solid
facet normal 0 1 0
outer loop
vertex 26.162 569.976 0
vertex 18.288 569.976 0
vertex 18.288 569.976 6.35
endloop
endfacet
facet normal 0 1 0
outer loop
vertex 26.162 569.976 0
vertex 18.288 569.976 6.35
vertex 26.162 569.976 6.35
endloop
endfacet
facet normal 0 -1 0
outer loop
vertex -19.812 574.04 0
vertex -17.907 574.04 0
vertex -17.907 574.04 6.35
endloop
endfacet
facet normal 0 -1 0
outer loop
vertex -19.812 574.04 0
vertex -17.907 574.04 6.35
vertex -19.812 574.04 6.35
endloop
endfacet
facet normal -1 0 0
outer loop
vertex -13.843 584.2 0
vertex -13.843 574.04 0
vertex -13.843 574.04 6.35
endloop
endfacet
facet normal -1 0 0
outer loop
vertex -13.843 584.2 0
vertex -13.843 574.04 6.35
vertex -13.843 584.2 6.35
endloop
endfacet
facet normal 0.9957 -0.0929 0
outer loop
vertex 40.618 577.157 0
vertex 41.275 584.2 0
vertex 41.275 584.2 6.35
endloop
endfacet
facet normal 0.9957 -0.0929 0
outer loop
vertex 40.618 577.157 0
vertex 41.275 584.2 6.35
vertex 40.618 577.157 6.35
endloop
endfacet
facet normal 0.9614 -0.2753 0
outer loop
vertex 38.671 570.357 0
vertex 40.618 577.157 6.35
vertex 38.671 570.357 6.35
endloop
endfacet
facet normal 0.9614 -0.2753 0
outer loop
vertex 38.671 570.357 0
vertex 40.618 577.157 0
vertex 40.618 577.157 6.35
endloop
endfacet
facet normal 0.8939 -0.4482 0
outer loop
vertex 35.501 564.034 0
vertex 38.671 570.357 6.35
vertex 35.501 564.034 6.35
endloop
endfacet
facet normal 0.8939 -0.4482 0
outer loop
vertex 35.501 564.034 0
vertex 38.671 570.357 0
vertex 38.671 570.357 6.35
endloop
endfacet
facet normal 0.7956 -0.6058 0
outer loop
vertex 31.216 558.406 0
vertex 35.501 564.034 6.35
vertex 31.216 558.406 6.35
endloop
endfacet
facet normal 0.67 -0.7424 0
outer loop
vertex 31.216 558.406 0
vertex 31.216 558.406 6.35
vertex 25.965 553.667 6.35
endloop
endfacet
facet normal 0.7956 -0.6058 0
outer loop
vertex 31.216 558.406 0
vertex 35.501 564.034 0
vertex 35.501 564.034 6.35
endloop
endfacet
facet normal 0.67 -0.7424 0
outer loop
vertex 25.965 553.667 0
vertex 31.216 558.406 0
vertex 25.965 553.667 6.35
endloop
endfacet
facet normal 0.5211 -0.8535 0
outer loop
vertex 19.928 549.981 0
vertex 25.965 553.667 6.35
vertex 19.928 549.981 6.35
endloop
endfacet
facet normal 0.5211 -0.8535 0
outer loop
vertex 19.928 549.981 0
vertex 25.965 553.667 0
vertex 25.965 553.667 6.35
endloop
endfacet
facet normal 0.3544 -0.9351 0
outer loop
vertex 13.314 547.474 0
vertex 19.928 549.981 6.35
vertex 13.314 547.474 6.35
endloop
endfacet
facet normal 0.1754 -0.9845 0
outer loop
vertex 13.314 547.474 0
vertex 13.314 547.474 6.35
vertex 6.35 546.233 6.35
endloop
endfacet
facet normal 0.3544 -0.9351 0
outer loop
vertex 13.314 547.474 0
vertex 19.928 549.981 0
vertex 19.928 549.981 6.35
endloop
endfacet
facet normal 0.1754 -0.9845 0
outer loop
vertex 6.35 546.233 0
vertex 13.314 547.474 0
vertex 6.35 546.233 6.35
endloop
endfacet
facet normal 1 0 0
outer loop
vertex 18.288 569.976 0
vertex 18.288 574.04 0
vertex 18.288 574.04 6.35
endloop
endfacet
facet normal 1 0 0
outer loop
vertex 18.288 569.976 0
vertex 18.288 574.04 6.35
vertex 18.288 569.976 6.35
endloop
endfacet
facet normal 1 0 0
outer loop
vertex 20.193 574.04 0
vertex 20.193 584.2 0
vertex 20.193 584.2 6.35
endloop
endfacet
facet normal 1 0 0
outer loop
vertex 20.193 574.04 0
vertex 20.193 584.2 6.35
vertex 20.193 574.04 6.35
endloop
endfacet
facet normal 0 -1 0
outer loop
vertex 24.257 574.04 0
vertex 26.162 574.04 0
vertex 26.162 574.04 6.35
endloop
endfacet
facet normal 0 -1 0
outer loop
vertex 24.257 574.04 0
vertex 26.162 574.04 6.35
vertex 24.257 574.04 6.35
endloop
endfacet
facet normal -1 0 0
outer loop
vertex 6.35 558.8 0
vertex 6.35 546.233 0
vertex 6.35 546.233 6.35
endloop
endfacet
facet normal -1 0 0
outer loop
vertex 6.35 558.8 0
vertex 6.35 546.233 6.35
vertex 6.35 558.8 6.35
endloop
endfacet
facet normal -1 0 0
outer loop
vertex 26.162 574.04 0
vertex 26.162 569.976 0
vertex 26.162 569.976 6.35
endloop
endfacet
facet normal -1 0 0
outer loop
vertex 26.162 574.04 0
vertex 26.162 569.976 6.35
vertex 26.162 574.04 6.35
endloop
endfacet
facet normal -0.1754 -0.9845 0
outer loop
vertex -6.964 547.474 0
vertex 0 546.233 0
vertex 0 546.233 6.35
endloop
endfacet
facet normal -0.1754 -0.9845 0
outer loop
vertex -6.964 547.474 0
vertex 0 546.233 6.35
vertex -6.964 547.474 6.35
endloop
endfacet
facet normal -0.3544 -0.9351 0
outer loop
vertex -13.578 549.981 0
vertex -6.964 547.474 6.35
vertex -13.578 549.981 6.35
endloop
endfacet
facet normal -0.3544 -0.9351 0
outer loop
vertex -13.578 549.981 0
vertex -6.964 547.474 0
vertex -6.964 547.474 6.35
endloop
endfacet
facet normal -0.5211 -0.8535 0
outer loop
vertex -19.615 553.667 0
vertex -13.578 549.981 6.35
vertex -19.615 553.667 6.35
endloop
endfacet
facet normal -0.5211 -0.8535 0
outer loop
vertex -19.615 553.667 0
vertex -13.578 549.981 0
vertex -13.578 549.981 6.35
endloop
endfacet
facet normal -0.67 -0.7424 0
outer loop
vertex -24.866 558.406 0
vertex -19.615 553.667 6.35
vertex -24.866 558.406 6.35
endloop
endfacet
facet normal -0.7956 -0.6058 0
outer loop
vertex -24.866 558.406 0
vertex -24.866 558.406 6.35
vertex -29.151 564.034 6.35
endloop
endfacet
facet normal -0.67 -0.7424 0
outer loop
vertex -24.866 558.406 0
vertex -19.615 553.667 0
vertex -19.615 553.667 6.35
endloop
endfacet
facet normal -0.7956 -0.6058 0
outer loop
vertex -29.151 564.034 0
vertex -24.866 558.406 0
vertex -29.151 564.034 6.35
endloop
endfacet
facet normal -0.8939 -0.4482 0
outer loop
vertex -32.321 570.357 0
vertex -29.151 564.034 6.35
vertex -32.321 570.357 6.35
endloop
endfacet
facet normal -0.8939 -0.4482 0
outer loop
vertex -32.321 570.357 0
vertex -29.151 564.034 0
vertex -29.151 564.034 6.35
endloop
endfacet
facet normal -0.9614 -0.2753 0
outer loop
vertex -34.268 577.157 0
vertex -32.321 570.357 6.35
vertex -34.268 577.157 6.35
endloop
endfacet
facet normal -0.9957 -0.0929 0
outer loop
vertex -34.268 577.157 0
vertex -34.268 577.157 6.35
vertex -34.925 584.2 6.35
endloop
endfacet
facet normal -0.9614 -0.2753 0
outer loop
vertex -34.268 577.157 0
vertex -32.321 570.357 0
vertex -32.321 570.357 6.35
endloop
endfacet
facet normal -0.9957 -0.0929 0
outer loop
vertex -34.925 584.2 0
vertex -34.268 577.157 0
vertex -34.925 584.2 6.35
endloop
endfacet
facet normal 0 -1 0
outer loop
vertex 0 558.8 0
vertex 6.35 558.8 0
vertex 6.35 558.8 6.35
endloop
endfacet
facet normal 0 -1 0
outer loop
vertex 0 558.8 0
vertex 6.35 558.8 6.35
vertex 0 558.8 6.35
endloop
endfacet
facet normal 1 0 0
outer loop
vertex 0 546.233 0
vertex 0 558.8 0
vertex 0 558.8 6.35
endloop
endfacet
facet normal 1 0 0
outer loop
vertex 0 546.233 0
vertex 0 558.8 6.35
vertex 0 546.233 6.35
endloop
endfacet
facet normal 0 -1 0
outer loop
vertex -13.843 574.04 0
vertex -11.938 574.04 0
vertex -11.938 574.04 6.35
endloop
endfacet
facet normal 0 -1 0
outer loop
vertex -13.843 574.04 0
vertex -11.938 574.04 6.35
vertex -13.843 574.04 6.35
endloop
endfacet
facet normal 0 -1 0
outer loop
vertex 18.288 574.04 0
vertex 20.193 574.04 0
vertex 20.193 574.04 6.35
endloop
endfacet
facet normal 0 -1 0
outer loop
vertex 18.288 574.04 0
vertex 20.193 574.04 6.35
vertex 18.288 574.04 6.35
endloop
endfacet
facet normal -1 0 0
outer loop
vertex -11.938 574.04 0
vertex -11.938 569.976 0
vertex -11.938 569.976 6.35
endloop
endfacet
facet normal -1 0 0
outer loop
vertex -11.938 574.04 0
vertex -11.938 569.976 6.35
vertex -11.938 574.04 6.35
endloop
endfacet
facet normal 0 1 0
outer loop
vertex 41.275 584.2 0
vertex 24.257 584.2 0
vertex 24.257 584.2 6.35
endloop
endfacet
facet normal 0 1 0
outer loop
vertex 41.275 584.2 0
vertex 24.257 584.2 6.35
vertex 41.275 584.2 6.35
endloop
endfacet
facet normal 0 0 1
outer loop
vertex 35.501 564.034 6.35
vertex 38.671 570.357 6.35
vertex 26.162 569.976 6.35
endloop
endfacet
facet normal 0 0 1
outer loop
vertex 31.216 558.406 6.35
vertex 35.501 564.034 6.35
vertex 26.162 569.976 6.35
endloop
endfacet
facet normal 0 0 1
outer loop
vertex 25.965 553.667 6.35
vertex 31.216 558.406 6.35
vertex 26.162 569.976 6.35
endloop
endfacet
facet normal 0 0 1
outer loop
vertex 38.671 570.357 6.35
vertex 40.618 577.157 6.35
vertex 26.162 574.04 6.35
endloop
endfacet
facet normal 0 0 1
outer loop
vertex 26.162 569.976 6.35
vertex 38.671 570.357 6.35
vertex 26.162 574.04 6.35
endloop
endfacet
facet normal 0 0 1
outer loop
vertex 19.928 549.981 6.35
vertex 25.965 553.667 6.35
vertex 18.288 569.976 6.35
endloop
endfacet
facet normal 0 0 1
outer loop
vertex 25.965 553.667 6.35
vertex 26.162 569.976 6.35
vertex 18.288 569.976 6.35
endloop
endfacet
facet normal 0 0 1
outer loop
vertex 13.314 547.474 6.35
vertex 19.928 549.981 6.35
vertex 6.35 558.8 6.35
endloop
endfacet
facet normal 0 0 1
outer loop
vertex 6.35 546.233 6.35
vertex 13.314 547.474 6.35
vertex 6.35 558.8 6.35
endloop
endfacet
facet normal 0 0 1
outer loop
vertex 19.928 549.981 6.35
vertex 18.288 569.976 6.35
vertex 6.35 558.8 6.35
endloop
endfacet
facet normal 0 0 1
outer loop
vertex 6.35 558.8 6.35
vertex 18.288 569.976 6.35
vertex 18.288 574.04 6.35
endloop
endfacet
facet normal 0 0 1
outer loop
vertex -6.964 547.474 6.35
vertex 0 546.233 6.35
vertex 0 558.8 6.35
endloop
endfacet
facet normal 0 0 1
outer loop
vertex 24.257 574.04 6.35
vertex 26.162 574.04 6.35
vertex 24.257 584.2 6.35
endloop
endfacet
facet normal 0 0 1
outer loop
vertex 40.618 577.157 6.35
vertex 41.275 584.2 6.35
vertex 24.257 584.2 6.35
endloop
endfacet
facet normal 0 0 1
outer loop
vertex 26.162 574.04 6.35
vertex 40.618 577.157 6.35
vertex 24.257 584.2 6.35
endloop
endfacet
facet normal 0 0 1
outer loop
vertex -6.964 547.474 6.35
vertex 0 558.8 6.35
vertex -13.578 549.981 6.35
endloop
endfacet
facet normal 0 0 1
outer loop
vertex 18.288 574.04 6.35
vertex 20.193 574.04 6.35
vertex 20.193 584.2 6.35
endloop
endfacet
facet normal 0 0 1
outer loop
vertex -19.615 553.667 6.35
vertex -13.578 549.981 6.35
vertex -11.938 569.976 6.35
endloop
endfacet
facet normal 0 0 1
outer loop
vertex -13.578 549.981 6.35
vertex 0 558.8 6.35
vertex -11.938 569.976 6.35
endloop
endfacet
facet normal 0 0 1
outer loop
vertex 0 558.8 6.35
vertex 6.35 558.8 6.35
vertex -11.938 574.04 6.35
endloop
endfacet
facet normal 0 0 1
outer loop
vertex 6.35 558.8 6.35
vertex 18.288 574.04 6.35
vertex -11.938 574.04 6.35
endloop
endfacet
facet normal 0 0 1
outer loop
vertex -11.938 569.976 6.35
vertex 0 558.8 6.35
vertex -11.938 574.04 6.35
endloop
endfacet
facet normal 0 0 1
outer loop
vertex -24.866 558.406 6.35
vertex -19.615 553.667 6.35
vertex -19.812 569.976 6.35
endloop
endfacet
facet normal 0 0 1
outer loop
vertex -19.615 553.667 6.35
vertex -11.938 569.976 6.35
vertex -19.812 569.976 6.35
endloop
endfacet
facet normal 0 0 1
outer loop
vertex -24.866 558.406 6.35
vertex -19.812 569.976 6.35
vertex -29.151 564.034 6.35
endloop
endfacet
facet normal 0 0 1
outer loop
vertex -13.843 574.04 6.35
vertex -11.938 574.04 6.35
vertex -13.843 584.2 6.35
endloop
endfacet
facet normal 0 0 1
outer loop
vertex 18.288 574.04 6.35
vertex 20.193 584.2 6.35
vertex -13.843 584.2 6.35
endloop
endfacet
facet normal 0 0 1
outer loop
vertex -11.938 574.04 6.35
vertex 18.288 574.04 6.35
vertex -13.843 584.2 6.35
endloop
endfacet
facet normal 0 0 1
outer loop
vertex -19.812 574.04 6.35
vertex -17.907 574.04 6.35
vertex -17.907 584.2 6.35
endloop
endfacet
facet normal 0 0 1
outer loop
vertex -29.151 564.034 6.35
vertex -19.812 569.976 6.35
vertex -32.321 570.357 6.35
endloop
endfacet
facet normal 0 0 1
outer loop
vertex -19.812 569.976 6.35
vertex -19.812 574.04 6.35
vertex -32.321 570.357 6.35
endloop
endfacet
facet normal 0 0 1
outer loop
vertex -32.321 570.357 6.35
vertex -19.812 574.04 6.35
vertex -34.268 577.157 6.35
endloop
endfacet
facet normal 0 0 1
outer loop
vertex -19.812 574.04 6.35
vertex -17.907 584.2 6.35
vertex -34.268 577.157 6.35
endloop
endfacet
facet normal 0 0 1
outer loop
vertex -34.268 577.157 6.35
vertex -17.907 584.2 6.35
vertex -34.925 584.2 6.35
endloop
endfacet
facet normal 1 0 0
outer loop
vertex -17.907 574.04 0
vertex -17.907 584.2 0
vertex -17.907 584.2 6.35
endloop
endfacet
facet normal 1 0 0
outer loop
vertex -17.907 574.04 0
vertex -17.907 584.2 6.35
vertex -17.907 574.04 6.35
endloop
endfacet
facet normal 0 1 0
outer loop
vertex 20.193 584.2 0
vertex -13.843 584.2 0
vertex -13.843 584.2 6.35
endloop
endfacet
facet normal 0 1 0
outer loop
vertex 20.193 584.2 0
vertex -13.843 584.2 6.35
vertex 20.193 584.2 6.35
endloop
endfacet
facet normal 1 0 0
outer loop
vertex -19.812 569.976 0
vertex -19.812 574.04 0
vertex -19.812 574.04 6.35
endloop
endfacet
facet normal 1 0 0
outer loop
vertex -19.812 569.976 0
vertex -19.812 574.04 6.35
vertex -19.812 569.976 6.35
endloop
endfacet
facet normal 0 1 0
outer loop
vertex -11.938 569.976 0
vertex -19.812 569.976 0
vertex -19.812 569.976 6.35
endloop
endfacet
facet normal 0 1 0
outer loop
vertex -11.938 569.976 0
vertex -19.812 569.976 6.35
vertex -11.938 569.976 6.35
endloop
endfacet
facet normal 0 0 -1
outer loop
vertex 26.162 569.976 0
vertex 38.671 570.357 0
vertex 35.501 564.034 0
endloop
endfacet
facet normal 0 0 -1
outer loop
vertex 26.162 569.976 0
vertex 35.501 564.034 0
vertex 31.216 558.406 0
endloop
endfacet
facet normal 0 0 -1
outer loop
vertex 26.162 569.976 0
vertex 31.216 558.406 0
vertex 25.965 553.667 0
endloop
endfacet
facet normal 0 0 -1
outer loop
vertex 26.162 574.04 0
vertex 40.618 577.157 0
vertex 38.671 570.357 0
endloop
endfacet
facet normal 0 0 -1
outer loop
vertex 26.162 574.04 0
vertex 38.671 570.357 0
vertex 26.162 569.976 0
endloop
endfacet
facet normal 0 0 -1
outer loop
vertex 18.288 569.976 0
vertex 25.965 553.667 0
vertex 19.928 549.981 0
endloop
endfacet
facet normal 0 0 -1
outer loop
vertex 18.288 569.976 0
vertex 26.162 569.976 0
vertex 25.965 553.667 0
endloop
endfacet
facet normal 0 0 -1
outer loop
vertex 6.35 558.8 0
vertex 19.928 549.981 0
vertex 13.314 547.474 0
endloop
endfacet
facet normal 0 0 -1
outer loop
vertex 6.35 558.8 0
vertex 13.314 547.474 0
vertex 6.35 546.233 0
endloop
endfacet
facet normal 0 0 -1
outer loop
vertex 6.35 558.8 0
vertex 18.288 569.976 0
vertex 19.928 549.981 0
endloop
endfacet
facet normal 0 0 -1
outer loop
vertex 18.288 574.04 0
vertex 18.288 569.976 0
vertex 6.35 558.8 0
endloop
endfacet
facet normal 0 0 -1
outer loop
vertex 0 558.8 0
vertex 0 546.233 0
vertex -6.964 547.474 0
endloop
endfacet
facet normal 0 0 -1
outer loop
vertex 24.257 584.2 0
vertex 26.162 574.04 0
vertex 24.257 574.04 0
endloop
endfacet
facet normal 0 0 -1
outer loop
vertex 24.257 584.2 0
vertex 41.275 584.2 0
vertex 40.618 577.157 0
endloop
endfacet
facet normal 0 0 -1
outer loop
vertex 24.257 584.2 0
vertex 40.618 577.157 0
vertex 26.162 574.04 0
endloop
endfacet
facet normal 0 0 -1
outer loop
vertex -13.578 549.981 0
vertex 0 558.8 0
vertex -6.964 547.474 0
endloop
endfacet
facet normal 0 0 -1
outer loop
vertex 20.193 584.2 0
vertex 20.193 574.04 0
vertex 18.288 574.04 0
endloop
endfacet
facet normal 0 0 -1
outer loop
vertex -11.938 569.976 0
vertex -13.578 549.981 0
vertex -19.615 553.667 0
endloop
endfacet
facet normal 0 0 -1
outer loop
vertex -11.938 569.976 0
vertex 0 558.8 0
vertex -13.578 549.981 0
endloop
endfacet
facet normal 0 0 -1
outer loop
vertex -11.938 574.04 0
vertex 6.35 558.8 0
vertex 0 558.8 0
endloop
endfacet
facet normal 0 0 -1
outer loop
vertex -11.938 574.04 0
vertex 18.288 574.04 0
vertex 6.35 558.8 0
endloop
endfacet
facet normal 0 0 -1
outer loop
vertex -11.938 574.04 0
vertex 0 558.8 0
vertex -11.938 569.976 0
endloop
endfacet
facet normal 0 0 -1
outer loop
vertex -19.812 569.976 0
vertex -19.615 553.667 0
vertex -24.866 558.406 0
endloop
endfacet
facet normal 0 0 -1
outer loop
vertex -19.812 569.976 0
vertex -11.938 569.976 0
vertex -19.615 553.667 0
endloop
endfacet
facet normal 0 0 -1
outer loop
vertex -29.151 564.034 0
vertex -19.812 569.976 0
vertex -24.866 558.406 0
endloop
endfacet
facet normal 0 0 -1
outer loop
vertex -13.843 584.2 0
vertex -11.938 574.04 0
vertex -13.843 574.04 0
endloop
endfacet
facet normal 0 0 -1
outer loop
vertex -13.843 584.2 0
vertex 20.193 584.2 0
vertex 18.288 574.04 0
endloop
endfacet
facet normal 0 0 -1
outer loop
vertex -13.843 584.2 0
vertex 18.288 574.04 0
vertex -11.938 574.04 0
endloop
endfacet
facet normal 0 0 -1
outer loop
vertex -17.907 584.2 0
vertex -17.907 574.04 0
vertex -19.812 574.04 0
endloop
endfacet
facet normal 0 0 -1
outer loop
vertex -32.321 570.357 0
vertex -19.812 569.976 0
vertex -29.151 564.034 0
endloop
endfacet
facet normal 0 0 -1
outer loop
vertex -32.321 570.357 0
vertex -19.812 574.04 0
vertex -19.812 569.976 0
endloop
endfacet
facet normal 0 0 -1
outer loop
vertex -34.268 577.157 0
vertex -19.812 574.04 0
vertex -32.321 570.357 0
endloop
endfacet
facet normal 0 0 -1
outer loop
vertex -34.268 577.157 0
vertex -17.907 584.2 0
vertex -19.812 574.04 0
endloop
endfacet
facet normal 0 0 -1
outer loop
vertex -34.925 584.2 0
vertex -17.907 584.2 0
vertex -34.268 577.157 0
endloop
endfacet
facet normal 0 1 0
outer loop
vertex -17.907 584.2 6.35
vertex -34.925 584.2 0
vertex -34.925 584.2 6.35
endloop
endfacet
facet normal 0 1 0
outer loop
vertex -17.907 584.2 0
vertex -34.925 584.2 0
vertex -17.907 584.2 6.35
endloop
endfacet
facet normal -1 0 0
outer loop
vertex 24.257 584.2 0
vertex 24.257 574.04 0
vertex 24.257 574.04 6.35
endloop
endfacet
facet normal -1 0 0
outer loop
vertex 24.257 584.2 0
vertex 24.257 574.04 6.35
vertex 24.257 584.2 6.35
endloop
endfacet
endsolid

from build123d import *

# Parameters (mm, degrees)
BOSS_EXTRUDE1_DEPTH = 6.35


with BuildPart() as part:
    # Sketch1 → Boss-Extrude1 (new body)
    with BuildSketch(Plane.XY):
        with BuildLine():
            Line((3.175, 584.2), (20.193, 584.2))
            Line((20.193, 584.2), (20.193, 574.04))
            Line((20.193, 574.04), (18.288, 574.04))
            Line((18.288, 574.04), (18.288, 572.554033861))
            Line((18.288, 572.554033861), (18.288, 569.976))
            Line((18.288, 569.976), (26.162, 569.976))
            Line((26.162, 569.976), (26.162, 572.554033861))
            Line((26.162, 572.554033861), (26.162, 574.04))
            Line((26.162, 574.04), (24.257, 574.04))
            Line((24.257, 574.04), (24.257, 584.2))
            Line((24.257, 584.2), (41.275, 584.2))
            ThreePointArc((41.275, 584.2), (31.215840751, 558.406178065), (6.35, 546.232522141))
            Line((6.35, 546.232522141), (6.35, 558.8))
            Line((6.35, 558.8), (0, 558.8))
            Line((0, 558.8), (0, 546.232522141))
            ThreePointArc((0, 546.232522141), (-24.865840751, 558.406178065), (-34.925, 584.2))
            Line((-34.925, 584.2), (-17.907, 584.2))
            Line((-17.907, 584.2), (-17.907, 574.04))
            Line((-17.907, 574.04), (-19.812, 574.04))
            Line((-19.812, 574.04), (-19.812, 572.554033861))
            Line((-19.812, 572.554033861), (-19.812, 569.976))
            Line((-19.812, 569.976), (-11.938, 569.976))
            Line((-11.938, 569.976), (-11.938, 572.554033861))
            Line((-11.938, 572.554033861), (-11.938, 574.04))
            Line((-11.938, 574.04), (-13.843, 574.04))
            Line((-13.843, 574.04), (-13.843, 584.2))
            Line((-13.843, 584.2), (3.175, 584.2))
        make_face()
    extrude(amount=BOSS_EXTRUDE1_DEPTH)


solid = part.part
